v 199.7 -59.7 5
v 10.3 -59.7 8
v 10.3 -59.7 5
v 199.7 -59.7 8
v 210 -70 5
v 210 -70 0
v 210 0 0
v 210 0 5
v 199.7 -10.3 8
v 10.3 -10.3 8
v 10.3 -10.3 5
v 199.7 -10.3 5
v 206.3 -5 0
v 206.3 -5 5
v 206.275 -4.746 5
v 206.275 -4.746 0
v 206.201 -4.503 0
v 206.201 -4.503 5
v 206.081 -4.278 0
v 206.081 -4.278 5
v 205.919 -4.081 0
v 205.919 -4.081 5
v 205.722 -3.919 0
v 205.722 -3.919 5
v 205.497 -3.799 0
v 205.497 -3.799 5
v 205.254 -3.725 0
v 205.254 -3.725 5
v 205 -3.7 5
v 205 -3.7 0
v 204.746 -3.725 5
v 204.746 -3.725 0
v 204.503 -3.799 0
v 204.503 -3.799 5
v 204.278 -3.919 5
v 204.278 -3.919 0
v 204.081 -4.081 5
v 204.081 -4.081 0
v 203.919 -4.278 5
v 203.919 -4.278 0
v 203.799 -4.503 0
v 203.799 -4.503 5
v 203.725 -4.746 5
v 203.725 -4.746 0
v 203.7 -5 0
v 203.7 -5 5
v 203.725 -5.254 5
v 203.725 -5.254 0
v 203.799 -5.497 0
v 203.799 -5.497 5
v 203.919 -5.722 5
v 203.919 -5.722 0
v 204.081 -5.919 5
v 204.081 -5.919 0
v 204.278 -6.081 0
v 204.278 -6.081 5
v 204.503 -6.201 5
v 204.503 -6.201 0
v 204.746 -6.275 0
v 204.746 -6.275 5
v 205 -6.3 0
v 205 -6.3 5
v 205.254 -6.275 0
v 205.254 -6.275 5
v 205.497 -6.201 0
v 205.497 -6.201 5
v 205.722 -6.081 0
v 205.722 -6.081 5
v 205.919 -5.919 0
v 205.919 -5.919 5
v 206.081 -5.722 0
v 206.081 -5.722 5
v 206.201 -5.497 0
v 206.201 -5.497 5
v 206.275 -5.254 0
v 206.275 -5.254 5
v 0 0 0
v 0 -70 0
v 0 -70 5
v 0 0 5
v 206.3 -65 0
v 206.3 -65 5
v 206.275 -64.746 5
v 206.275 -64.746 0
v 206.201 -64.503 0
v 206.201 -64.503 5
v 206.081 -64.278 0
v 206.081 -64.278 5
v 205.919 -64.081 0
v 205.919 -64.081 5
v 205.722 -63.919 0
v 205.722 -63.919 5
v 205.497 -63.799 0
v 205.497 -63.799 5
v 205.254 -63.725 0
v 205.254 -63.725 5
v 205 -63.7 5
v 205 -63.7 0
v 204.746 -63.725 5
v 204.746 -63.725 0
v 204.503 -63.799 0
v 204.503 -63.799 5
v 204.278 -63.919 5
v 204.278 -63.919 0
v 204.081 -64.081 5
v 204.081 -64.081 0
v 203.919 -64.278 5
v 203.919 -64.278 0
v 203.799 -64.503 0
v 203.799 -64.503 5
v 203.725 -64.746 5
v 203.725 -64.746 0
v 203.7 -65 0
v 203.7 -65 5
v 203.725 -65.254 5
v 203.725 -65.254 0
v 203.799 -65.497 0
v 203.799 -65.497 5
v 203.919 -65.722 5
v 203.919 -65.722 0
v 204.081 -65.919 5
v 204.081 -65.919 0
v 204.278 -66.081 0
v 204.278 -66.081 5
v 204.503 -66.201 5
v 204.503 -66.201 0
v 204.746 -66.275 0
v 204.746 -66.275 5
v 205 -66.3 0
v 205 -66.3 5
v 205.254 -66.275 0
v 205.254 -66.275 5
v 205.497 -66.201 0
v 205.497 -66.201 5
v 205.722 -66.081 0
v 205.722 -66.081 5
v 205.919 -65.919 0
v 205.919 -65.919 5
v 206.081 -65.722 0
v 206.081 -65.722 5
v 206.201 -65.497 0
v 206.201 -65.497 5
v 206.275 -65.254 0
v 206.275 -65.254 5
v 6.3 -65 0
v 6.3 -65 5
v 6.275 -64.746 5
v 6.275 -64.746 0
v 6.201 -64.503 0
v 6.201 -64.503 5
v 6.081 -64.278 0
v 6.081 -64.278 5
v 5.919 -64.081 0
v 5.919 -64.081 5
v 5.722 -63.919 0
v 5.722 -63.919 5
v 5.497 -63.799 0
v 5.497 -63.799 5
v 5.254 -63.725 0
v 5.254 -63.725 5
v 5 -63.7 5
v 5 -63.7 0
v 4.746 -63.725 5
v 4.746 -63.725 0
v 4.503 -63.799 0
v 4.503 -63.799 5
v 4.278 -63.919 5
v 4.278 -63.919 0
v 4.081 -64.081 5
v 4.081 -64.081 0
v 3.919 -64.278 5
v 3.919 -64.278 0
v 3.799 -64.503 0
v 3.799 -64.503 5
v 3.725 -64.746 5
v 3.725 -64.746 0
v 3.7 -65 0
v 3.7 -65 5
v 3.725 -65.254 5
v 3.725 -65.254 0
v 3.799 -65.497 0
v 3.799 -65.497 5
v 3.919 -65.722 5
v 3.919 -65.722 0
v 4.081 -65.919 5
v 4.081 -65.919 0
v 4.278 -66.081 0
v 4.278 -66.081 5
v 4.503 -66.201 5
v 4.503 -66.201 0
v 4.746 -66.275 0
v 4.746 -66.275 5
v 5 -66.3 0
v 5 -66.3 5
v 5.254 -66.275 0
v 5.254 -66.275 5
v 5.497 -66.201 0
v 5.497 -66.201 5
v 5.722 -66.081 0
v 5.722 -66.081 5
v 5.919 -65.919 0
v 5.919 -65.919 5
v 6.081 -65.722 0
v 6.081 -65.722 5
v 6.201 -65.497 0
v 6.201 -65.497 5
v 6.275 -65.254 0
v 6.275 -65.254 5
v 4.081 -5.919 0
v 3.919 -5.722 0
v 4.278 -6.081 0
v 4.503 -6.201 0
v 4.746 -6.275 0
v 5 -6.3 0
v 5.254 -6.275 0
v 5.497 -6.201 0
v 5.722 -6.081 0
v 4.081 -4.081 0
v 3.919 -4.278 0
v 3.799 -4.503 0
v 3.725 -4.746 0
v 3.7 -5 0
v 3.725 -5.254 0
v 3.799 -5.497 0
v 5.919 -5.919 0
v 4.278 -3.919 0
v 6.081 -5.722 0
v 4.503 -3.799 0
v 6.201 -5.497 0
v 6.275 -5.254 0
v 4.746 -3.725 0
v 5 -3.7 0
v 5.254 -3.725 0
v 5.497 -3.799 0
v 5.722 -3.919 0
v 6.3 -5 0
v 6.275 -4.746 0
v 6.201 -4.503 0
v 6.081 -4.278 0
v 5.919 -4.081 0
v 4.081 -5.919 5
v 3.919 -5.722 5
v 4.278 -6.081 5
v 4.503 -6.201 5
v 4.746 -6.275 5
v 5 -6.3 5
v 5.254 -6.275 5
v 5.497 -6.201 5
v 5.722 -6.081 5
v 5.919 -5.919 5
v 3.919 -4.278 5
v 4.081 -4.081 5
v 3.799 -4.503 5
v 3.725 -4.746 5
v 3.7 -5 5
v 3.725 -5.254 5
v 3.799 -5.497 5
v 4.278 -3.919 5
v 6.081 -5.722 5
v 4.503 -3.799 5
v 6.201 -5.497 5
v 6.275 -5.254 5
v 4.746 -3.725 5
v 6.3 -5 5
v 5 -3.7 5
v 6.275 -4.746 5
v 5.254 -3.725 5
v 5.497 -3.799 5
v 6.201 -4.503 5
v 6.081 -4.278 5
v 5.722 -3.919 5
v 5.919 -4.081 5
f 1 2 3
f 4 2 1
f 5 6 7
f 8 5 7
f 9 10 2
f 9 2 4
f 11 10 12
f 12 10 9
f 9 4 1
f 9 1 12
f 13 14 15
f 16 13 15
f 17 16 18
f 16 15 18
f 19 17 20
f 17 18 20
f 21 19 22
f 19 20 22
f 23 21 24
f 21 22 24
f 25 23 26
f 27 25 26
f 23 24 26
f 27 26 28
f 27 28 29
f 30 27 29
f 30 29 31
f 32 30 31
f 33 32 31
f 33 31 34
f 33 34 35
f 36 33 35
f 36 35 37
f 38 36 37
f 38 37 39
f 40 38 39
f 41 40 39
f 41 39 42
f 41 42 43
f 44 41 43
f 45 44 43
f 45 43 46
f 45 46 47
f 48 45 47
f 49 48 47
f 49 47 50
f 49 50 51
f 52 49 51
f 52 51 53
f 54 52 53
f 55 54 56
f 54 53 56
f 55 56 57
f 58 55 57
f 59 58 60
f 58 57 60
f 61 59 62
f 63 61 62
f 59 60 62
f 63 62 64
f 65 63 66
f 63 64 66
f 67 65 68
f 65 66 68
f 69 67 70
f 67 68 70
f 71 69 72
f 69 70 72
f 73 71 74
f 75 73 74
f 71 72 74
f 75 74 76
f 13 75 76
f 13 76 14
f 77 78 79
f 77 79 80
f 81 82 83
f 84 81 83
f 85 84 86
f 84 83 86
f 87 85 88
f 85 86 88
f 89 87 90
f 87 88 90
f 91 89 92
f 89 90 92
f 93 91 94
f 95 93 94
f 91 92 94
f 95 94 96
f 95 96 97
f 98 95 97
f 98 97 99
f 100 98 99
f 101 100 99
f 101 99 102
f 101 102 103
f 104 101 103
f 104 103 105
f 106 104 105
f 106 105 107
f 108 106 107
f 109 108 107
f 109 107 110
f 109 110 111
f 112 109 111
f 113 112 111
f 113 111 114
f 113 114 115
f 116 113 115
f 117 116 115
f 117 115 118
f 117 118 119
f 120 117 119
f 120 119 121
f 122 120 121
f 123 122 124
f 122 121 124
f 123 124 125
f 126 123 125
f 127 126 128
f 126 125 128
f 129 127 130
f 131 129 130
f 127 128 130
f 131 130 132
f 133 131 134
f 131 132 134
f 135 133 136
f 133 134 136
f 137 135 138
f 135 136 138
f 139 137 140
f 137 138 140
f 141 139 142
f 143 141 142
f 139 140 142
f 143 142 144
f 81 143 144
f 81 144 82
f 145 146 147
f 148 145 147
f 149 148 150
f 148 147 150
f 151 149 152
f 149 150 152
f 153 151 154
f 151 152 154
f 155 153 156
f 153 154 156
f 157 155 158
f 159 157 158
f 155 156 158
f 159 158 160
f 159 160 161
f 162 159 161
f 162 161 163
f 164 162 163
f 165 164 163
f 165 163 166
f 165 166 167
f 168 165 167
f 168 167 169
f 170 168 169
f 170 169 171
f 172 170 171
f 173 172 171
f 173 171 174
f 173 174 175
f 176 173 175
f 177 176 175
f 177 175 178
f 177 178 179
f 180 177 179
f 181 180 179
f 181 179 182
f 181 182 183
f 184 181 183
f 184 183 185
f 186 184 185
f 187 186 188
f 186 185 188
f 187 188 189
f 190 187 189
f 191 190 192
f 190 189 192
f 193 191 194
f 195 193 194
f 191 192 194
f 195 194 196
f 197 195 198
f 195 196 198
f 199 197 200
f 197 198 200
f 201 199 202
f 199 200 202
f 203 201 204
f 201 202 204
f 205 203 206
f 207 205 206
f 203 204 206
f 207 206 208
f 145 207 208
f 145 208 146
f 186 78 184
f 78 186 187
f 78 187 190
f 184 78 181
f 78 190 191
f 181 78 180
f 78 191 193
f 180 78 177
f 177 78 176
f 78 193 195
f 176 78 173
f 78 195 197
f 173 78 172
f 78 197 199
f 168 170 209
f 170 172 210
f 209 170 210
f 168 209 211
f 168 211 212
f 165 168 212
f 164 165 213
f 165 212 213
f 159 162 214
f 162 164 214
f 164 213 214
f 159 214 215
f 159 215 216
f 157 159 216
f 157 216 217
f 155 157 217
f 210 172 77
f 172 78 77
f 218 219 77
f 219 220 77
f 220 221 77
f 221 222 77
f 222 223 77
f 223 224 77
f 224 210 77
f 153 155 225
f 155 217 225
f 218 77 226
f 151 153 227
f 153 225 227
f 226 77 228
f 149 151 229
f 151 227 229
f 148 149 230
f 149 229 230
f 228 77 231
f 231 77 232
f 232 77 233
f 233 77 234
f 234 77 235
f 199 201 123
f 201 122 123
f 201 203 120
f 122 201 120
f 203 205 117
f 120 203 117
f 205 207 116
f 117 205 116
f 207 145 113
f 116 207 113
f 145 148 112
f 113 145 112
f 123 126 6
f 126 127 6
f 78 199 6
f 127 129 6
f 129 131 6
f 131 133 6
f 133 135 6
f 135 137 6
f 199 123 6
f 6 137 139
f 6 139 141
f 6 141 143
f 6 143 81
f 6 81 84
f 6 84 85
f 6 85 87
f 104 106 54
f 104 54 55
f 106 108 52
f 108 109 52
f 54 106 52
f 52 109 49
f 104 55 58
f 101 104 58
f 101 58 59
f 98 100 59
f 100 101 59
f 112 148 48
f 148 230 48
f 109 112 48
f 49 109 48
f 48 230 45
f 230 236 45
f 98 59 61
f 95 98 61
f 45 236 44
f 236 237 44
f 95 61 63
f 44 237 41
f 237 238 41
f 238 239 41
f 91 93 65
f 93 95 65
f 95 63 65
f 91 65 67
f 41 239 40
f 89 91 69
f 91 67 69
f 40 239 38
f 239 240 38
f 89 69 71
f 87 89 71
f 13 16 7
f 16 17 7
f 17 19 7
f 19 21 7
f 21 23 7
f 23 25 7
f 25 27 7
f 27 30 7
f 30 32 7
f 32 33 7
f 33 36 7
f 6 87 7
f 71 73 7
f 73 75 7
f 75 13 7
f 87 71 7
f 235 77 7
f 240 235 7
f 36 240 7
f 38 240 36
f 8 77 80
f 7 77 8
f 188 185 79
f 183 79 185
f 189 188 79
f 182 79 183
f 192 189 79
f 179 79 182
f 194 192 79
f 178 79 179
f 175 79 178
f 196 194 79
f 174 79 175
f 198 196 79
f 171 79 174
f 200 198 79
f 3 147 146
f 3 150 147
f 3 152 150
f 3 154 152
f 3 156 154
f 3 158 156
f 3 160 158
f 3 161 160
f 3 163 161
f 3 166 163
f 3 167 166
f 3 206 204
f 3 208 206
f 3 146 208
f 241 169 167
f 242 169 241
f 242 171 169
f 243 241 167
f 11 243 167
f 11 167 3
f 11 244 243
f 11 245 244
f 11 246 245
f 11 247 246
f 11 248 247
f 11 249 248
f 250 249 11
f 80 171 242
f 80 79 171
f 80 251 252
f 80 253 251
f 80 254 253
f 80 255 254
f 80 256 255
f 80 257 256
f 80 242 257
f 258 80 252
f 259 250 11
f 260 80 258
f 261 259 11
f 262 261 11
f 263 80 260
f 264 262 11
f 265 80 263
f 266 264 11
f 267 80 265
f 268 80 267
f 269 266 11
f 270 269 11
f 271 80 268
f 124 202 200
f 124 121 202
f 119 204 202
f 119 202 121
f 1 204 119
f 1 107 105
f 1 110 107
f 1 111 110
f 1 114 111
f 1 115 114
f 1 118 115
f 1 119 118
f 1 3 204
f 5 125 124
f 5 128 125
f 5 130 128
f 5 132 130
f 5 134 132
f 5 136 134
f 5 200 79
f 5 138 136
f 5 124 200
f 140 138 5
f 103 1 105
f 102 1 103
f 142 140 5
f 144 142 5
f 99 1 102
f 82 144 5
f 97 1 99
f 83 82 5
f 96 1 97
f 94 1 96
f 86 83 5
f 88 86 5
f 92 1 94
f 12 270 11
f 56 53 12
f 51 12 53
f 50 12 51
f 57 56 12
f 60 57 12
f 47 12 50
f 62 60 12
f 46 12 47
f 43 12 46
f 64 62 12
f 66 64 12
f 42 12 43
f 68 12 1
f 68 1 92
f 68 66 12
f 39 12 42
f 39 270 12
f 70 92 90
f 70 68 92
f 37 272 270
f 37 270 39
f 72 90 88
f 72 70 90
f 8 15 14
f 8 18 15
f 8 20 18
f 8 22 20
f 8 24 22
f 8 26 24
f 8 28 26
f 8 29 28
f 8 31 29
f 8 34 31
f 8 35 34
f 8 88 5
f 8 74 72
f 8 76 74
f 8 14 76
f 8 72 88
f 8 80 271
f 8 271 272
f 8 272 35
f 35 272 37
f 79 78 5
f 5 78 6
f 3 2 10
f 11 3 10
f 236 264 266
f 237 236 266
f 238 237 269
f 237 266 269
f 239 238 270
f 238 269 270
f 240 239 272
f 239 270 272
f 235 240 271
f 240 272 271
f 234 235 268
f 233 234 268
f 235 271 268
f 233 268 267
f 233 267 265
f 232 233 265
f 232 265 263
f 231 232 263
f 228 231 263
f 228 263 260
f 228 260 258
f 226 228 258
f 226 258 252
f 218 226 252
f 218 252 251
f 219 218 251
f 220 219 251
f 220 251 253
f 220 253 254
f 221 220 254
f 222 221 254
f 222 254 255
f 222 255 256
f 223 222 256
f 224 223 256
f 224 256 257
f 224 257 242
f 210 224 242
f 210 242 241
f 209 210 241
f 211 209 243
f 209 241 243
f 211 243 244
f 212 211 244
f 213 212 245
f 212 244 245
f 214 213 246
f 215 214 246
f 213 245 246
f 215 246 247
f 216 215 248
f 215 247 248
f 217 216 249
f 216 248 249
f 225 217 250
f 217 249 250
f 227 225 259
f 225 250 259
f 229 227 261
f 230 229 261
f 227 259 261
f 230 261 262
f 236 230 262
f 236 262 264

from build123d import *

# Parameters (mm, degrees)
SKETCH014_W     = 210
SKETCH014_H     = 70
PAD004_DEPTH    = 8
SKETCH015_W     = 210
SKETCH015_H     = 70
SKETCH015_W_2   = 189.4
SKETCH015_H_2   = 49.4
POCKET006_DEPTH = 3
SKETCH016_R     = 1.3
POCKET007_DEPTH = 25


with BuildPart() as part:
    # Sketch014 → Pad004 (new body)
    with BuildSketch(Plane.XY):
        with Locations((105, -35)):
            Rectangle(SKETCH014_W, SKETCH014_H)
    extrude(amount=PAD004_DEPTH)

    # Sketch015 (on Face6 of Pad004) → Pocket006 (cut)
    with BuildSketch(Plane.XY.offset(8)):
        with Locations((105, -35)):
            Rectangle(SKETCH015_W, SKETCH015_H)
        with Locations((105, -35)):
            Rectangle(SKETCH015_W_2, SKETCH015_H_2, mode=Mode.SUBTRACT)
    extrude(amount=-POCKET006_DEPTH, mode=Mode.SUBTRACT)

    # Sketch016 (on Face11 of Pocket006) → Pocket007 (cut)
    with BuildSketch(Plane.XY.offset(8)):
        with Locations((5, -5)):
            Circle(SKETCH016_R)
        with Locations((205, -5)):
            Circle(SKETCH016_R)
        with Locations((205, -65)):
            Circle(SKETCH016_R)
        with Locations((5, -65)):
            Circle(SKETCH016_R)
    extrude(amount=-POCKET007_DEPTH, mode=Mode.SUBTRACT)


solid = part.part
